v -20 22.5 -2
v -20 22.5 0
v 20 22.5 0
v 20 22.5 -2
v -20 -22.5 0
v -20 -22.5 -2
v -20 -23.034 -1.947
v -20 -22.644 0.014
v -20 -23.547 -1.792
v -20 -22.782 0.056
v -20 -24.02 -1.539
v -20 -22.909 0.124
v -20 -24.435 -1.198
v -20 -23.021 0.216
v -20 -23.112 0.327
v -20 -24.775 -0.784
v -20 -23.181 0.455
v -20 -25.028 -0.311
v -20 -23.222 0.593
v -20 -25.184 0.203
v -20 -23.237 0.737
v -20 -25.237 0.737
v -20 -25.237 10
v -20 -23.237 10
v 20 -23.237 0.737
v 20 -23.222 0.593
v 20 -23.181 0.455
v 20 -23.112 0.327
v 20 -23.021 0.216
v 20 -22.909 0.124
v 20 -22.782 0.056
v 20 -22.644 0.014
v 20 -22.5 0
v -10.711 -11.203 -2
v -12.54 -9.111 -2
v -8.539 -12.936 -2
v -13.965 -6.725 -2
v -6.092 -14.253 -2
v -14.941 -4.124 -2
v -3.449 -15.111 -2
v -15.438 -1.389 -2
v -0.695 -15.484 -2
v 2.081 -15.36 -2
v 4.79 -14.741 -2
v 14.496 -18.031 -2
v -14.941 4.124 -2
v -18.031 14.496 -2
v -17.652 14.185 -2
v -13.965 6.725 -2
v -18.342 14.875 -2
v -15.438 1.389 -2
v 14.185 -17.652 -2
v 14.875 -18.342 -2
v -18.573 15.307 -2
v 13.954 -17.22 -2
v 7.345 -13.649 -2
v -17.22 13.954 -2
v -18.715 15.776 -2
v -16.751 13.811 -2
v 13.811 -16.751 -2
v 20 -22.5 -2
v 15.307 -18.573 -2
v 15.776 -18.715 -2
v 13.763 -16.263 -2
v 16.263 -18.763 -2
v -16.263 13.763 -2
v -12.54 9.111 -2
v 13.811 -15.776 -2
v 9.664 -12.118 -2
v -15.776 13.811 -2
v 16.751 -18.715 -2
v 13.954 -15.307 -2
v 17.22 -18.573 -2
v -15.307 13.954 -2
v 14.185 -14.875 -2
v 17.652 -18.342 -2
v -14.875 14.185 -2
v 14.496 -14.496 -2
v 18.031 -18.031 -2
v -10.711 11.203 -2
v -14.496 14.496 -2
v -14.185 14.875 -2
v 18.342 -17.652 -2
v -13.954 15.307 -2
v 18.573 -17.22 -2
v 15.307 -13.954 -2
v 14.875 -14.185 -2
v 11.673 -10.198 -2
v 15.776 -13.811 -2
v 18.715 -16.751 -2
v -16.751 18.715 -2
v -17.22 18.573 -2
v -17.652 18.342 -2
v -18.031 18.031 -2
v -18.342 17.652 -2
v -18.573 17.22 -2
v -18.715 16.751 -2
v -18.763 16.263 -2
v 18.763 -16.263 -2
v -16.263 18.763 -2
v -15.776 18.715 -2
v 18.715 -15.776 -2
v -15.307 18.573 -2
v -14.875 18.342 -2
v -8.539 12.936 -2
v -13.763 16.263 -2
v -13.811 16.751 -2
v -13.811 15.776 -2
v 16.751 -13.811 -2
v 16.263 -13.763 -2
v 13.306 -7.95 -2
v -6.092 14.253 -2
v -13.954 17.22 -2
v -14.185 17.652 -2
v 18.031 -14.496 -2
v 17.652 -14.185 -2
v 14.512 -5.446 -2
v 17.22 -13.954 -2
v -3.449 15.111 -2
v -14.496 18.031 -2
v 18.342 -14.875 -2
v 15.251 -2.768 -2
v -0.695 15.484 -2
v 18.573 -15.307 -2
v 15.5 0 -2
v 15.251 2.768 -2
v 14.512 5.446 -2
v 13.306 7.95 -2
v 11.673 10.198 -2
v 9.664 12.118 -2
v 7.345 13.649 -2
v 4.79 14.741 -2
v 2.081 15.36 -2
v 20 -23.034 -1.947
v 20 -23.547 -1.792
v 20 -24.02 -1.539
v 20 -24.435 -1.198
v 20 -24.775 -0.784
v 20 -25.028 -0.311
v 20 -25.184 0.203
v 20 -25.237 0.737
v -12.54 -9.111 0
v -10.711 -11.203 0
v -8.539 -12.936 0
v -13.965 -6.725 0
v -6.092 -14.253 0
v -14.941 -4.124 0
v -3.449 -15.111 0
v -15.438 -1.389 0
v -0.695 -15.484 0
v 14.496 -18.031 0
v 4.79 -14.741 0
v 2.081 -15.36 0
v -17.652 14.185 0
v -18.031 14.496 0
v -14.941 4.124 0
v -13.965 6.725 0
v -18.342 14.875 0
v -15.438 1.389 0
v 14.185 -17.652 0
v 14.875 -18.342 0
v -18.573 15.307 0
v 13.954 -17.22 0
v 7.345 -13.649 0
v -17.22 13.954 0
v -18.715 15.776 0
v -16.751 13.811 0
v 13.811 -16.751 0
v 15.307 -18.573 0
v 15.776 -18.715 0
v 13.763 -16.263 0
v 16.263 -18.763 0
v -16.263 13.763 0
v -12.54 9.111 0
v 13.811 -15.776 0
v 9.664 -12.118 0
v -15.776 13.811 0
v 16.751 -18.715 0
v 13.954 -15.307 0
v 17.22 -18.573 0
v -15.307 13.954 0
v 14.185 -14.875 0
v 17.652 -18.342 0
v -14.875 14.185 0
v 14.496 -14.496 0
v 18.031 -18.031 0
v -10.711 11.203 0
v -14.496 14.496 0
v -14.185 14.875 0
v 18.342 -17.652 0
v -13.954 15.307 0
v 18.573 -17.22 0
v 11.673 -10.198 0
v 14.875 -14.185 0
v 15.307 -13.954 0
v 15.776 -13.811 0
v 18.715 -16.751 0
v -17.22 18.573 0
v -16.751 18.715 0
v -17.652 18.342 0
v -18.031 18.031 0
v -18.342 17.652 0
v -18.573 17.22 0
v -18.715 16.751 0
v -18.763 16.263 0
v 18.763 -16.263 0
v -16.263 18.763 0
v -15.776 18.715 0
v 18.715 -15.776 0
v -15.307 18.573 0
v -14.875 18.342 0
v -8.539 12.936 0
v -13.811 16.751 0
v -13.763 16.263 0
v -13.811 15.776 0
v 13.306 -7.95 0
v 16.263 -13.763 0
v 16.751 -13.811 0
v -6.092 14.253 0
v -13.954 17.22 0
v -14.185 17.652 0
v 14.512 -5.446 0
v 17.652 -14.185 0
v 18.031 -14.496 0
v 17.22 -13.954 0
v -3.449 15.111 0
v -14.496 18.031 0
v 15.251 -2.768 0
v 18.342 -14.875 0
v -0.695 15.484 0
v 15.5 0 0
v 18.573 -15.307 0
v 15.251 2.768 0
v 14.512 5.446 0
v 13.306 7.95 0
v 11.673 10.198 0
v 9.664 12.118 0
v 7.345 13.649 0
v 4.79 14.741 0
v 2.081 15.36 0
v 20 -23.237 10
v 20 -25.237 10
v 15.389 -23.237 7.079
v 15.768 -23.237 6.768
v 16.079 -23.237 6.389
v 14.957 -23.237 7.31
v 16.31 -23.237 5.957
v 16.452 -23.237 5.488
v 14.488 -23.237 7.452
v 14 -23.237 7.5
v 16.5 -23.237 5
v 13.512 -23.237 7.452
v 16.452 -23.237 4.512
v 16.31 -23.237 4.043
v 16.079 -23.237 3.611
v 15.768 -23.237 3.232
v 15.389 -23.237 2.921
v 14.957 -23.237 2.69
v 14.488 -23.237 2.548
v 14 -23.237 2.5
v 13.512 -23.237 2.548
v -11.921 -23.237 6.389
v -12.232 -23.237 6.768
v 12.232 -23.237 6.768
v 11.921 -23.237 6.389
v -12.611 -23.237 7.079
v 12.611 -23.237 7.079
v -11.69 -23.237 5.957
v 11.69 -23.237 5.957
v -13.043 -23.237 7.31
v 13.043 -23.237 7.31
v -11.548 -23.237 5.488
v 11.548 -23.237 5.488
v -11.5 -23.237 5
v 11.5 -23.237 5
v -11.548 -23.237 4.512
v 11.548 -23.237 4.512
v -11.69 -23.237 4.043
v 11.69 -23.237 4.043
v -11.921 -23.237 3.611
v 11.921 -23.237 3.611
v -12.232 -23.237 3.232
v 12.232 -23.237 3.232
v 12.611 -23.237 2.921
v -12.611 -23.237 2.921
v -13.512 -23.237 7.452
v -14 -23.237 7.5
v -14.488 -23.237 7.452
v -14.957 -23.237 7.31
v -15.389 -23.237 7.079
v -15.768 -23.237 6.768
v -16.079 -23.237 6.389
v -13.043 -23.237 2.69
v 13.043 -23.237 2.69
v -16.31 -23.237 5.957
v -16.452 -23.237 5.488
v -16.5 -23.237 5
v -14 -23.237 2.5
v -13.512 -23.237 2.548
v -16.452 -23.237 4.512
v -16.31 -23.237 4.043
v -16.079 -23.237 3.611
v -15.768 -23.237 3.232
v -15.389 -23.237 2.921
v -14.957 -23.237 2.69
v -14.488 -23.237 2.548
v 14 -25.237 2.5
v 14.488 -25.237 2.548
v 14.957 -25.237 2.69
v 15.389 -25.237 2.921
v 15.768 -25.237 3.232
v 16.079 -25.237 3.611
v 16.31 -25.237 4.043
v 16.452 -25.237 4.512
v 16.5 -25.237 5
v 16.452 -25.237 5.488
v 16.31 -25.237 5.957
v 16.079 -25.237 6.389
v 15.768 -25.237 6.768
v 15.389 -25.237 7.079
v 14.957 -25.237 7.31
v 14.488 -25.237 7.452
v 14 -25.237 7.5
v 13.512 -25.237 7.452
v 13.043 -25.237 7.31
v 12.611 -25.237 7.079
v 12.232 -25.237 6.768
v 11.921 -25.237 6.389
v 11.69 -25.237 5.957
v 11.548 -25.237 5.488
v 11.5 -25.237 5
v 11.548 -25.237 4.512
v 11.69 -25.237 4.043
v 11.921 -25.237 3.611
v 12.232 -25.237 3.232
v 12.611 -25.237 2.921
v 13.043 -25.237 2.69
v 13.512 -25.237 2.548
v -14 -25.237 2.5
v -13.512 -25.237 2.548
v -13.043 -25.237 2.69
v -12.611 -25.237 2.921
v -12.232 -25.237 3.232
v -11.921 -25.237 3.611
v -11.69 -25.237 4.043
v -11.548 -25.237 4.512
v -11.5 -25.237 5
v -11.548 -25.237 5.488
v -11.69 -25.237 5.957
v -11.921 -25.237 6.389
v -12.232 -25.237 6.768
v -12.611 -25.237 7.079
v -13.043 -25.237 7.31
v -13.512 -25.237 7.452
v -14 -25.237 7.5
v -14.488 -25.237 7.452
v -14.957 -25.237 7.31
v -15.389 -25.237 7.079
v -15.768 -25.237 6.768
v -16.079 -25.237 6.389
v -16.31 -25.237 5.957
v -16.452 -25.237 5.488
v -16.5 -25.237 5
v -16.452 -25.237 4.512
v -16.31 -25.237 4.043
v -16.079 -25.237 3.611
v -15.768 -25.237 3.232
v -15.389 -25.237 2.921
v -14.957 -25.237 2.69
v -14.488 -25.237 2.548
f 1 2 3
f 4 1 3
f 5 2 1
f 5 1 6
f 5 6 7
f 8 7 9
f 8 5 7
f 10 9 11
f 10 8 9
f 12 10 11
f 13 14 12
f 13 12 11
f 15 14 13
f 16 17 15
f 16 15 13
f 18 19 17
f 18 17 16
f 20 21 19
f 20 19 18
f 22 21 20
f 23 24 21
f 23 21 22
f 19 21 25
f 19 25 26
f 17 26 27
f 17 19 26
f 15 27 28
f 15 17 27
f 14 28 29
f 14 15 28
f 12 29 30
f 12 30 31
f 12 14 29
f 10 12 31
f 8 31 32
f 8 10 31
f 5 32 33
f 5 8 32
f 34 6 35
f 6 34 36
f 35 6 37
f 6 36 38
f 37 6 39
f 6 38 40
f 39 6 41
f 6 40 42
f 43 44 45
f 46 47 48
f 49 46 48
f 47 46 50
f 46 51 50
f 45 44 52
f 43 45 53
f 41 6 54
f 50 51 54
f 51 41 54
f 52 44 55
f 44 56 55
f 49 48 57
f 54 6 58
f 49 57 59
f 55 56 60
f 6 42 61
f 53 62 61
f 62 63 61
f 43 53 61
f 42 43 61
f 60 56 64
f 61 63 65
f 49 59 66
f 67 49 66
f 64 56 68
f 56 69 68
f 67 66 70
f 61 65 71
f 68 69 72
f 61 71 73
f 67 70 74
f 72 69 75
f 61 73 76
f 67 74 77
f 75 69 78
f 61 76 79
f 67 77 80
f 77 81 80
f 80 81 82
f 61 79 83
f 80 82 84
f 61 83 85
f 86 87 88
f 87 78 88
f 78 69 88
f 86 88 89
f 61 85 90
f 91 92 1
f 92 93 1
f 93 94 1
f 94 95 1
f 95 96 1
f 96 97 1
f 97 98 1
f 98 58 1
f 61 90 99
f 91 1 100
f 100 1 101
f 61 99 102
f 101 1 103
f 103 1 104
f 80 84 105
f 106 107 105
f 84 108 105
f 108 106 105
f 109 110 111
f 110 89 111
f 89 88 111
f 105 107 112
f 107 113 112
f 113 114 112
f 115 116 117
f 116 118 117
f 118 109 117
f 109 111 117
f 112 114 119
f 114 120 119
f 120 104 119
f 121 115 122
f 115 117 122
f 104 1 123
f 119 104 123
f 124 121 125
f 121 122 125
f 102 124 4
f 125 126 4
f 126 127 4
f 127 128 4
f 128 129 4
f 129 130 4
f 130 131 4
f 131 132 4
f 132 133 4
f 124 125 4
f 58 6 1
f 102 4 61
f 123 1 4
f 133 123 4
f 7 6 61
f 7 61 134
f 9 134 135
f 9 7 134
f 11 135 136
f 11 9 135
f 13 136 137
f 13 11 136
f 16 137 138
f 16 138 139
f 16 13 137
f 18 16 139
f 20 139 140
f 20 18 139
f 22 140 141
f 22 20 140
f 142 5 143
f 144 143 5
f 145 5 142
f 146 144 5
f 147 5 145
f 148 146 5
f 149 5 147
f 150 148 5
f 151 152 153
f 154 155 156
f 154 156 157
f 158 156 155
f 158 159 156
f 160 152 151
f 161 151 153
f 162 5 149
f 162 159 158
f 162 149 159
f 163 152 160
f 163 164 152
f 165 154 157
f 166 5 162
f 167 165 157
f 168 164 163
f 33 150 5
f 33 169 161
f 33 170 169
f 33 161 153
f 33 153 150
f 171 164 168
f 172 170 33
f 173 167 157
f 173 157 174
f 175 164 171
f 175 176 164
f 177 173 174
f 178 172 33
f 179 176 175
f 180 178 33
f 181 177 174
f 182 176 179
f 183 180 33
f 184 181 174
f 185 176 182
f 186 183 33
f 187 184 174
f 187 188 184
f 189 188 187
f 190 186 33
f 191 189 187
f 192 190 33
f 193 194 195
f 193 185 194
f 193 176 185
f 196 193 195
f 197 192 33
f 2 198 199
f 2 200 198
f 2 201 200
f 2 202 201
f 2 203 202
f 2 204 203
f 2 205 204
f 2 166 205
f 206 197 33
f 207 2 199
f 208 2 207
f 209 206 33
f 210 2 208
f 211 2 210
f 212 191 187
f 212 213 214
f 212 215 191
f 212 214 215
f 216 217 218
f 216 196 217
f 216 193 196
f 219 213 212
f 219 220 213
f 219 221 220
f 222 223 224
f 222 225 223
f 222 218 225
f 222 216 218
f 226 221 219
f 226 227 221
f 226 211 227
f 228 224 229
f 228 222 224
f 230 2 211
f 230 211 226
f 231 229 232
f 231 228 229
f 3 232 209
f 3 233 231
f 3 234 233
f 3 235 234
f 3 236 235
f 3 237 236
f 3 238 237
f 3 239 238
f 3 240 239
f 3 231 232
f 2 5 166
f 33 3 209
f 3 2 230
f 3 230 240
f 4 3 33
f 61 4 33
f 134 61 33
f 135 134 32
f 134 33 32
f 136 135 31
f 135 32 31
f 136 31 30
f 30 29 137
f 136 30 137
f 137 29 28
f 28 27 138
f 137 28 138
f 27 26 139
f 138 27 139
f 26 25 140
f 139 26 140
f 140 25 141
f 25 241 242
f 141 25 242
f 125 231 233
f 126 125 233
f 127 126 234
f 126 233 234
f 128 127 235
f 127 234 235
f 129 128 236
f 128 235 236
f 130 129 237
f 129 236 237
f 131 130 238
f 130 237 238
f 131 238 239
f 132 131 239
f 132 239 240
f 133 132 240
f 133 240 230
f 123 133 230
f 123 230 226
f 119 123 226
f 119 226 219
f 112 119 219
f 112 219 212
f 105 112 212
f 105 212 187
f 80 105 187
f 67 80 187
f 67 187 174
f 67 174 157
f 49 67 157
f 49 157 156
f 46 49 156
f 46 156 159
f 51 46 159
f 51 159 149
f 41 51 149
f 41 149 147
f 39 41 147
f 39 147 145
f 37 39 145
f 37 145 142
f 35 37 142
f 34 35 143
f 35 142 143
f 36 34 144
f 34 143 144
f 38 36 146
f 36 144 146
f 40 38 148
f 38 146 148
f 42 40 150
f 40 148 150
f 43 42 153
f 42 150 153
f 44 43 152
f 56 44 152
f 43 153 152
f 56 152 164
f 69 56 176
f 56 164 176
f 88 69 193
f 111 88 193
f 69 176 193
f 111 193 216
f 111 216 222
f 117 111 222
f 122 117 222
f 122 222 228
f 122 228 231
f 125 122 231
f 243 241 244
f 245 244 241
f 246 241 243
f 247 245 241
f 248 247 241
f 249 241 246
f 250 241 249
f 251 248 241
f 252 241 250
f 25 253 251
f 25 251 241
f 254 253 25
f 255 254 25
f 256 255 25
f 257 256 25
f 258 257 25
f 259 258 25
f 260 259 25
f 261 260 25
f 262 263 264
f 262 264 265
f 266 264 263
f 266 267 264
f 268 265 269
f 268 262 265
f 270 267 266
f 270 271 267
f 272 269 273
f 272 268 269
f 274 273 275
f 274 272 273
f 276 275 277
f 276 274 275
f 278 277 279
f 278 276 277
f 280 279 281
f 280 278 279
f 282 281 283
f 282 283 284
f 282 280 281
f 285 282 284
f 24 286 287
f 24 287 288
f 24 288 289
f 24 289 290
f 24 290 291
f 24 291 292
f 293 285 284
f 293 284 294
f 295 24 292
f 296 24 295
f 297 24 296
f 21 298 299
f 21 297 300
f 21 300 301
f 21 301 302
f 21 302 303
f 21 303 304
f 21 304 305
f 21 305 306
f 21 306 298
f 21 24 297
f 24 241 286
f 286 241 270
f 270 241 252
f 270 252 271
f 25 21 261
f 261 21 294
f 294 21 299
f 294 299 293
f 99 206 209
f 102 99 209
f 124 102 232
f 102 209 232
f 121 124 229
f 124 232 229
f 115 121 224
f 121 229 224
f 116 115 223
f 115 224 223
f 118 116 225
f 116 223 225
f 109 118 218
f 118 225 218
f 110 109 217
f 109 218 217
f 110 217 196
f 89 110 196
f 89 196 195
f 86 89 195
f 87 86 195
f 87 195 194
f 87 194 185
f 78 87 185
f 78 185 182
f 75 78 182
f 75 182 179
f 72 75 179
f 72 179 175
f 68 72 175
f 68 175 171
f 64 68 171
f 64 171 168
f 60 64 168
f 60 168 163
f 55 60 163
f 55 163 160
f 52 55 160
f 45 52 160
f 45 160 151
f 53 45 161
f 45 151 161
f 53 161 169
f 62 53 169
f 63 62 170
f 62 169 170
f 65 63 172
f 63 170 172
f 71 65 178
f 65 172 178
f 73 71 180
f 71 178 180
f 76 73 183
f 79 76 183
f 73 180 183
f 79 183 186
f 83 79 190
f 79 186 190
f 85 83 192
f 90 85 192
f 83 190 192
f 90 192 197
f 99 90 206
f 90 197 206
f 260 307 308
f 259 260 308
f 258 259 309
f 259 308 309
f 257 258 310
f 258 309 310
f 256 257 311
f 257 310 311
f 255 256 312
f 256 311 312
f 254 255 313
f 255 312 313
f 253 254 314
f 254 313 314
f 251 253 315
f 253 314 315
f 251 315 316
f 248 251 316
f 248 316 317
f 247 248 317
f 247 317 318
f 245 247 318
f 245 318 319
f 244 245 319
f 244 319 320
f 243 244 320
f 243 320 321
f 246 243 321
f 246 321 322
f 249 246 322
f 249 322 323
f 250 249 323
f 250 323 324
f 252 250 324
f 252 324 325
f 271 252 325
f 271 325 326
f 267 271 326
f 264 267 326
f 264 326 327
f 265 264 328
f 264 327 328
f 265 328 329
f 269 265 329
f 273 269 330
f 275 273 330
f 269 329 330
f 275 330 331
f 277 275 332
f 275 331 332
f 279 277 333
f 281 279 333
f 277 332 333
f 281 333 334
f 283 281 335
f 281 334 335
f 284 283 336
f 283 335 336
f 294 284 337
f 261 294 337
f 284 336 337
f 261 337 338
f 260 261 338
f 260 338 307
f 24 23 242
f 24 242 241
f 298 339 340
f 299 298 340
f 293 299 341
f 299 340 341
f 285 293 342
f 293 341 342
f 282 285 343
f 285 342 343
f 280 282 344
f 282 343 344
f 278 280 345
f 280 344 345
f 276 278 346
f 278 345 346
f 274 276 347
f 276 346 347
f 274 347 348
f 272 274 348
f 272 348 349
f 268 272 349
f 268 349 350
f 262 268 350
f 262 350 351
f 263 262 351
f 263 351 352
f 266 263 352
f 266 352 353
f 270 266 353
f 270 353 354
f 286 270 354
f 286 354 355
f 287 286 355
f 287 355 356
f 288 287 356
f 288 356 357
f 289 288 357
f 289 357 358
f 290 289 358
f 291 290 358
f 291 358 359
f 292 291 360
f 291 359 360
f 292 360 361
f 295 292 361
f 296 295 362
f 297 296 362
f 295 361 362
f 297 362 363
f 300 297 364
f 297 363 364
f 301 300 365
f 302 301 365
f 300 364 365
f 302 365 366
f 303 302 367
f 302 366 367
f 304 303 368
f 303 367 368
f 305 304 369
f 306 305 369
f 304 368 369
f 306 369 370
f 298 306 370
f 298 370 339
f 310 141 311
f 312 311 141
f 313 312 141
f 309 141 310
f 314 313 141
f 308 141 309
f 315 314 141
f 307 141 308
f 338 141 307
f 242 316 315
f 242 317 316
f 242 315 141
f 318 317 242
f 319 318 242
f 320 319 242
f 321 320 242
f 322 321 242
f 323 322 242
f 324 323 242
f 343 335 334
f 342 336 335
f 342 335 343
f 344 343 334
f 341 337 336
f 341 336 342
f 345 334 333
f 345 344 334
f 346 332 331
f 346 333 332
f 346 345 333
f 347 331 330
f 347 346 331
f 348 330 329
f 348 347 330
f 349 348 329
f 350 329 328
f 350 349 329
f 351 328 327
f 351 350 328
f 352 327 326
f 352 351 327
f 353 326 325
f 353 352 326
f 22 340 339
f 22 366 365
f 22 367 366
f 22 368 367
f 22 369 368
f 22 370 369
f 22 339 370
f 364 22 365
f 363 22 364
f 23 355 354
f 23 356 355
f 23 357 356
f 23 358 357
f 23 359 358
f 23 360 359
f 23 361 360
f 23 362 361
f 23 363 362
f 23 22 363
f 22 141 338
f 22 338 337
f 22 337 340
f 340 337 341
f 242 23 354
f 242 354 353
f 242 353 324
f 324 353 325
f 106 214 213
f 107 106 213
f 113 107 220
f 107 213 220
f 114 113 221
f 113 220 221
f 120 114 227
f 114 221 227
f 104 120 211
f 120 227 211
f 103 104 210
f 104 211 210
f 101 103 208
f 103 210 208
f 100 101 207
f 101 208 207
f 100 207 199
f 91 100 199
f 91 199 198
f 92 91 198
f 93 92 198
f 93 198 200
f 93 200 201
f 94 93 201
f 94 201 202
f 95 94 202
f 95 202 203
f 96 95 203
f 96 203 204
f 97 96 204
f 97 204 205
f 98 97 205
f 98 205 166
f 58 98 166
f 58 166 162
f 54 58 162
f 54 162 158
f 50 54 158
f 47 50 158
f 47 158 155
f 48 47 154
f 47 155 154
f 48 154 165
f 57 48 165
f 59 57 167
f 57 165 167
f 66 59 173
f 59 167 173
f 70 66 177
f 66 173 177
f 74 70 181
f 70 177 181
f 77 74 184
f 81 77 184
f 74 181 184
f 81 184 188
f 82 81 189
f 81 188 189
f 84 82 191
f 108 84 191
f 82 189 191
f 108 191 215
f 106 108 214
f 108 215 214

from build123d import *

# Parameters (mm, degrees)
SKETCH1_W          = 40
SKETCH1_H          = 45
BASE_FLANGE1_DEPTH = 2
SKETCH8_R          = 15.5
CUT_EXTRUDE5_DEPTH = 31.170349683
SKETCH9_R          = 2.5
CUT_EXTRUDE6_DEPTH = 31.170349683
EDGE_FLANGE1_DEPTH = 40
SKETCH13_R         = 2.5
CUT_EXTRUDE7_DEPTH = 53.714162988


# Sheet-metal steps are written as plain solids
with BuildPart() as part:
    # Sketch1 → Base-Flange1 (new body)
    with BuildSketch(Plane.XY):
        Rectangle(SKETCH1_W, SKETCH1_H)
    extrude(amount=-BASE_FLANGE1_DEPTH)

    # Sketch8 → Cut-Extrude5 (cut, through all)
    with BuildSketch(Plane.XY):
        Circle(SKETCH8_R)
    extrude(amount=-CUT_EXTRUDE5_DEPTH, mode=Mode.SUBTRACT)

    # Sketch9 → Cut-Extrude6 (cut, through all)
    with BuildSketch(Plane.XY):
        with Locations((-16.263455967, 16.263455967)):
            Circle(SKETCH9_R)
        with Locations((16.263455967, -16.263455967)):
            Circle(SKETCH9_R)
    extrude(amount=-CUT_EXTRUDE6_DEPTH, mode=Mode.SUBTRACT)

    # Edge-Flange1 section (across the edge) → Edge-Flange1 (add)
    with BuildSketch(Plane(origin=(-20, -23.2366, 0), x_dir=(0, 1, 0), z_dir=(1, 0, 0))):
        with BuildLine():
            Line((-2, 0.7366), (-2, 10))
            Line((-2, 10), (0, 10))
            Line((0, 10), (0, 0.7366))
            ThreePointArc((0, 0.7366), (0.215745145, 0.215745145), (0.7366, 0))
            Line((0.7366, 0), (0.7366, -2))
            ThreePointArc((0.7366, -2), (-1.198468417, -1.198468417), (-2, 0.7366))
        make_face()
    extrude(amount=EDGE_FLANGE1_DEPTH)

    # Sketch13 → Cut-Extrude7 (cut, through all)
    with BuildSketch(Plane.XZ.offset(25.2366)):
        with Locations(Location((-14, 5, 0), (0, 0, 270))):
            Circle(SKETCH13_R)
        with Locations(Location((14, 5, 0), (0, 0, 270))):
            Circle(SKETCH13_R)
    extrude(amount=-CUT_EXTRUDE7_DEPTH, mode=Mode.SUBTRACT)


solid = part.part
